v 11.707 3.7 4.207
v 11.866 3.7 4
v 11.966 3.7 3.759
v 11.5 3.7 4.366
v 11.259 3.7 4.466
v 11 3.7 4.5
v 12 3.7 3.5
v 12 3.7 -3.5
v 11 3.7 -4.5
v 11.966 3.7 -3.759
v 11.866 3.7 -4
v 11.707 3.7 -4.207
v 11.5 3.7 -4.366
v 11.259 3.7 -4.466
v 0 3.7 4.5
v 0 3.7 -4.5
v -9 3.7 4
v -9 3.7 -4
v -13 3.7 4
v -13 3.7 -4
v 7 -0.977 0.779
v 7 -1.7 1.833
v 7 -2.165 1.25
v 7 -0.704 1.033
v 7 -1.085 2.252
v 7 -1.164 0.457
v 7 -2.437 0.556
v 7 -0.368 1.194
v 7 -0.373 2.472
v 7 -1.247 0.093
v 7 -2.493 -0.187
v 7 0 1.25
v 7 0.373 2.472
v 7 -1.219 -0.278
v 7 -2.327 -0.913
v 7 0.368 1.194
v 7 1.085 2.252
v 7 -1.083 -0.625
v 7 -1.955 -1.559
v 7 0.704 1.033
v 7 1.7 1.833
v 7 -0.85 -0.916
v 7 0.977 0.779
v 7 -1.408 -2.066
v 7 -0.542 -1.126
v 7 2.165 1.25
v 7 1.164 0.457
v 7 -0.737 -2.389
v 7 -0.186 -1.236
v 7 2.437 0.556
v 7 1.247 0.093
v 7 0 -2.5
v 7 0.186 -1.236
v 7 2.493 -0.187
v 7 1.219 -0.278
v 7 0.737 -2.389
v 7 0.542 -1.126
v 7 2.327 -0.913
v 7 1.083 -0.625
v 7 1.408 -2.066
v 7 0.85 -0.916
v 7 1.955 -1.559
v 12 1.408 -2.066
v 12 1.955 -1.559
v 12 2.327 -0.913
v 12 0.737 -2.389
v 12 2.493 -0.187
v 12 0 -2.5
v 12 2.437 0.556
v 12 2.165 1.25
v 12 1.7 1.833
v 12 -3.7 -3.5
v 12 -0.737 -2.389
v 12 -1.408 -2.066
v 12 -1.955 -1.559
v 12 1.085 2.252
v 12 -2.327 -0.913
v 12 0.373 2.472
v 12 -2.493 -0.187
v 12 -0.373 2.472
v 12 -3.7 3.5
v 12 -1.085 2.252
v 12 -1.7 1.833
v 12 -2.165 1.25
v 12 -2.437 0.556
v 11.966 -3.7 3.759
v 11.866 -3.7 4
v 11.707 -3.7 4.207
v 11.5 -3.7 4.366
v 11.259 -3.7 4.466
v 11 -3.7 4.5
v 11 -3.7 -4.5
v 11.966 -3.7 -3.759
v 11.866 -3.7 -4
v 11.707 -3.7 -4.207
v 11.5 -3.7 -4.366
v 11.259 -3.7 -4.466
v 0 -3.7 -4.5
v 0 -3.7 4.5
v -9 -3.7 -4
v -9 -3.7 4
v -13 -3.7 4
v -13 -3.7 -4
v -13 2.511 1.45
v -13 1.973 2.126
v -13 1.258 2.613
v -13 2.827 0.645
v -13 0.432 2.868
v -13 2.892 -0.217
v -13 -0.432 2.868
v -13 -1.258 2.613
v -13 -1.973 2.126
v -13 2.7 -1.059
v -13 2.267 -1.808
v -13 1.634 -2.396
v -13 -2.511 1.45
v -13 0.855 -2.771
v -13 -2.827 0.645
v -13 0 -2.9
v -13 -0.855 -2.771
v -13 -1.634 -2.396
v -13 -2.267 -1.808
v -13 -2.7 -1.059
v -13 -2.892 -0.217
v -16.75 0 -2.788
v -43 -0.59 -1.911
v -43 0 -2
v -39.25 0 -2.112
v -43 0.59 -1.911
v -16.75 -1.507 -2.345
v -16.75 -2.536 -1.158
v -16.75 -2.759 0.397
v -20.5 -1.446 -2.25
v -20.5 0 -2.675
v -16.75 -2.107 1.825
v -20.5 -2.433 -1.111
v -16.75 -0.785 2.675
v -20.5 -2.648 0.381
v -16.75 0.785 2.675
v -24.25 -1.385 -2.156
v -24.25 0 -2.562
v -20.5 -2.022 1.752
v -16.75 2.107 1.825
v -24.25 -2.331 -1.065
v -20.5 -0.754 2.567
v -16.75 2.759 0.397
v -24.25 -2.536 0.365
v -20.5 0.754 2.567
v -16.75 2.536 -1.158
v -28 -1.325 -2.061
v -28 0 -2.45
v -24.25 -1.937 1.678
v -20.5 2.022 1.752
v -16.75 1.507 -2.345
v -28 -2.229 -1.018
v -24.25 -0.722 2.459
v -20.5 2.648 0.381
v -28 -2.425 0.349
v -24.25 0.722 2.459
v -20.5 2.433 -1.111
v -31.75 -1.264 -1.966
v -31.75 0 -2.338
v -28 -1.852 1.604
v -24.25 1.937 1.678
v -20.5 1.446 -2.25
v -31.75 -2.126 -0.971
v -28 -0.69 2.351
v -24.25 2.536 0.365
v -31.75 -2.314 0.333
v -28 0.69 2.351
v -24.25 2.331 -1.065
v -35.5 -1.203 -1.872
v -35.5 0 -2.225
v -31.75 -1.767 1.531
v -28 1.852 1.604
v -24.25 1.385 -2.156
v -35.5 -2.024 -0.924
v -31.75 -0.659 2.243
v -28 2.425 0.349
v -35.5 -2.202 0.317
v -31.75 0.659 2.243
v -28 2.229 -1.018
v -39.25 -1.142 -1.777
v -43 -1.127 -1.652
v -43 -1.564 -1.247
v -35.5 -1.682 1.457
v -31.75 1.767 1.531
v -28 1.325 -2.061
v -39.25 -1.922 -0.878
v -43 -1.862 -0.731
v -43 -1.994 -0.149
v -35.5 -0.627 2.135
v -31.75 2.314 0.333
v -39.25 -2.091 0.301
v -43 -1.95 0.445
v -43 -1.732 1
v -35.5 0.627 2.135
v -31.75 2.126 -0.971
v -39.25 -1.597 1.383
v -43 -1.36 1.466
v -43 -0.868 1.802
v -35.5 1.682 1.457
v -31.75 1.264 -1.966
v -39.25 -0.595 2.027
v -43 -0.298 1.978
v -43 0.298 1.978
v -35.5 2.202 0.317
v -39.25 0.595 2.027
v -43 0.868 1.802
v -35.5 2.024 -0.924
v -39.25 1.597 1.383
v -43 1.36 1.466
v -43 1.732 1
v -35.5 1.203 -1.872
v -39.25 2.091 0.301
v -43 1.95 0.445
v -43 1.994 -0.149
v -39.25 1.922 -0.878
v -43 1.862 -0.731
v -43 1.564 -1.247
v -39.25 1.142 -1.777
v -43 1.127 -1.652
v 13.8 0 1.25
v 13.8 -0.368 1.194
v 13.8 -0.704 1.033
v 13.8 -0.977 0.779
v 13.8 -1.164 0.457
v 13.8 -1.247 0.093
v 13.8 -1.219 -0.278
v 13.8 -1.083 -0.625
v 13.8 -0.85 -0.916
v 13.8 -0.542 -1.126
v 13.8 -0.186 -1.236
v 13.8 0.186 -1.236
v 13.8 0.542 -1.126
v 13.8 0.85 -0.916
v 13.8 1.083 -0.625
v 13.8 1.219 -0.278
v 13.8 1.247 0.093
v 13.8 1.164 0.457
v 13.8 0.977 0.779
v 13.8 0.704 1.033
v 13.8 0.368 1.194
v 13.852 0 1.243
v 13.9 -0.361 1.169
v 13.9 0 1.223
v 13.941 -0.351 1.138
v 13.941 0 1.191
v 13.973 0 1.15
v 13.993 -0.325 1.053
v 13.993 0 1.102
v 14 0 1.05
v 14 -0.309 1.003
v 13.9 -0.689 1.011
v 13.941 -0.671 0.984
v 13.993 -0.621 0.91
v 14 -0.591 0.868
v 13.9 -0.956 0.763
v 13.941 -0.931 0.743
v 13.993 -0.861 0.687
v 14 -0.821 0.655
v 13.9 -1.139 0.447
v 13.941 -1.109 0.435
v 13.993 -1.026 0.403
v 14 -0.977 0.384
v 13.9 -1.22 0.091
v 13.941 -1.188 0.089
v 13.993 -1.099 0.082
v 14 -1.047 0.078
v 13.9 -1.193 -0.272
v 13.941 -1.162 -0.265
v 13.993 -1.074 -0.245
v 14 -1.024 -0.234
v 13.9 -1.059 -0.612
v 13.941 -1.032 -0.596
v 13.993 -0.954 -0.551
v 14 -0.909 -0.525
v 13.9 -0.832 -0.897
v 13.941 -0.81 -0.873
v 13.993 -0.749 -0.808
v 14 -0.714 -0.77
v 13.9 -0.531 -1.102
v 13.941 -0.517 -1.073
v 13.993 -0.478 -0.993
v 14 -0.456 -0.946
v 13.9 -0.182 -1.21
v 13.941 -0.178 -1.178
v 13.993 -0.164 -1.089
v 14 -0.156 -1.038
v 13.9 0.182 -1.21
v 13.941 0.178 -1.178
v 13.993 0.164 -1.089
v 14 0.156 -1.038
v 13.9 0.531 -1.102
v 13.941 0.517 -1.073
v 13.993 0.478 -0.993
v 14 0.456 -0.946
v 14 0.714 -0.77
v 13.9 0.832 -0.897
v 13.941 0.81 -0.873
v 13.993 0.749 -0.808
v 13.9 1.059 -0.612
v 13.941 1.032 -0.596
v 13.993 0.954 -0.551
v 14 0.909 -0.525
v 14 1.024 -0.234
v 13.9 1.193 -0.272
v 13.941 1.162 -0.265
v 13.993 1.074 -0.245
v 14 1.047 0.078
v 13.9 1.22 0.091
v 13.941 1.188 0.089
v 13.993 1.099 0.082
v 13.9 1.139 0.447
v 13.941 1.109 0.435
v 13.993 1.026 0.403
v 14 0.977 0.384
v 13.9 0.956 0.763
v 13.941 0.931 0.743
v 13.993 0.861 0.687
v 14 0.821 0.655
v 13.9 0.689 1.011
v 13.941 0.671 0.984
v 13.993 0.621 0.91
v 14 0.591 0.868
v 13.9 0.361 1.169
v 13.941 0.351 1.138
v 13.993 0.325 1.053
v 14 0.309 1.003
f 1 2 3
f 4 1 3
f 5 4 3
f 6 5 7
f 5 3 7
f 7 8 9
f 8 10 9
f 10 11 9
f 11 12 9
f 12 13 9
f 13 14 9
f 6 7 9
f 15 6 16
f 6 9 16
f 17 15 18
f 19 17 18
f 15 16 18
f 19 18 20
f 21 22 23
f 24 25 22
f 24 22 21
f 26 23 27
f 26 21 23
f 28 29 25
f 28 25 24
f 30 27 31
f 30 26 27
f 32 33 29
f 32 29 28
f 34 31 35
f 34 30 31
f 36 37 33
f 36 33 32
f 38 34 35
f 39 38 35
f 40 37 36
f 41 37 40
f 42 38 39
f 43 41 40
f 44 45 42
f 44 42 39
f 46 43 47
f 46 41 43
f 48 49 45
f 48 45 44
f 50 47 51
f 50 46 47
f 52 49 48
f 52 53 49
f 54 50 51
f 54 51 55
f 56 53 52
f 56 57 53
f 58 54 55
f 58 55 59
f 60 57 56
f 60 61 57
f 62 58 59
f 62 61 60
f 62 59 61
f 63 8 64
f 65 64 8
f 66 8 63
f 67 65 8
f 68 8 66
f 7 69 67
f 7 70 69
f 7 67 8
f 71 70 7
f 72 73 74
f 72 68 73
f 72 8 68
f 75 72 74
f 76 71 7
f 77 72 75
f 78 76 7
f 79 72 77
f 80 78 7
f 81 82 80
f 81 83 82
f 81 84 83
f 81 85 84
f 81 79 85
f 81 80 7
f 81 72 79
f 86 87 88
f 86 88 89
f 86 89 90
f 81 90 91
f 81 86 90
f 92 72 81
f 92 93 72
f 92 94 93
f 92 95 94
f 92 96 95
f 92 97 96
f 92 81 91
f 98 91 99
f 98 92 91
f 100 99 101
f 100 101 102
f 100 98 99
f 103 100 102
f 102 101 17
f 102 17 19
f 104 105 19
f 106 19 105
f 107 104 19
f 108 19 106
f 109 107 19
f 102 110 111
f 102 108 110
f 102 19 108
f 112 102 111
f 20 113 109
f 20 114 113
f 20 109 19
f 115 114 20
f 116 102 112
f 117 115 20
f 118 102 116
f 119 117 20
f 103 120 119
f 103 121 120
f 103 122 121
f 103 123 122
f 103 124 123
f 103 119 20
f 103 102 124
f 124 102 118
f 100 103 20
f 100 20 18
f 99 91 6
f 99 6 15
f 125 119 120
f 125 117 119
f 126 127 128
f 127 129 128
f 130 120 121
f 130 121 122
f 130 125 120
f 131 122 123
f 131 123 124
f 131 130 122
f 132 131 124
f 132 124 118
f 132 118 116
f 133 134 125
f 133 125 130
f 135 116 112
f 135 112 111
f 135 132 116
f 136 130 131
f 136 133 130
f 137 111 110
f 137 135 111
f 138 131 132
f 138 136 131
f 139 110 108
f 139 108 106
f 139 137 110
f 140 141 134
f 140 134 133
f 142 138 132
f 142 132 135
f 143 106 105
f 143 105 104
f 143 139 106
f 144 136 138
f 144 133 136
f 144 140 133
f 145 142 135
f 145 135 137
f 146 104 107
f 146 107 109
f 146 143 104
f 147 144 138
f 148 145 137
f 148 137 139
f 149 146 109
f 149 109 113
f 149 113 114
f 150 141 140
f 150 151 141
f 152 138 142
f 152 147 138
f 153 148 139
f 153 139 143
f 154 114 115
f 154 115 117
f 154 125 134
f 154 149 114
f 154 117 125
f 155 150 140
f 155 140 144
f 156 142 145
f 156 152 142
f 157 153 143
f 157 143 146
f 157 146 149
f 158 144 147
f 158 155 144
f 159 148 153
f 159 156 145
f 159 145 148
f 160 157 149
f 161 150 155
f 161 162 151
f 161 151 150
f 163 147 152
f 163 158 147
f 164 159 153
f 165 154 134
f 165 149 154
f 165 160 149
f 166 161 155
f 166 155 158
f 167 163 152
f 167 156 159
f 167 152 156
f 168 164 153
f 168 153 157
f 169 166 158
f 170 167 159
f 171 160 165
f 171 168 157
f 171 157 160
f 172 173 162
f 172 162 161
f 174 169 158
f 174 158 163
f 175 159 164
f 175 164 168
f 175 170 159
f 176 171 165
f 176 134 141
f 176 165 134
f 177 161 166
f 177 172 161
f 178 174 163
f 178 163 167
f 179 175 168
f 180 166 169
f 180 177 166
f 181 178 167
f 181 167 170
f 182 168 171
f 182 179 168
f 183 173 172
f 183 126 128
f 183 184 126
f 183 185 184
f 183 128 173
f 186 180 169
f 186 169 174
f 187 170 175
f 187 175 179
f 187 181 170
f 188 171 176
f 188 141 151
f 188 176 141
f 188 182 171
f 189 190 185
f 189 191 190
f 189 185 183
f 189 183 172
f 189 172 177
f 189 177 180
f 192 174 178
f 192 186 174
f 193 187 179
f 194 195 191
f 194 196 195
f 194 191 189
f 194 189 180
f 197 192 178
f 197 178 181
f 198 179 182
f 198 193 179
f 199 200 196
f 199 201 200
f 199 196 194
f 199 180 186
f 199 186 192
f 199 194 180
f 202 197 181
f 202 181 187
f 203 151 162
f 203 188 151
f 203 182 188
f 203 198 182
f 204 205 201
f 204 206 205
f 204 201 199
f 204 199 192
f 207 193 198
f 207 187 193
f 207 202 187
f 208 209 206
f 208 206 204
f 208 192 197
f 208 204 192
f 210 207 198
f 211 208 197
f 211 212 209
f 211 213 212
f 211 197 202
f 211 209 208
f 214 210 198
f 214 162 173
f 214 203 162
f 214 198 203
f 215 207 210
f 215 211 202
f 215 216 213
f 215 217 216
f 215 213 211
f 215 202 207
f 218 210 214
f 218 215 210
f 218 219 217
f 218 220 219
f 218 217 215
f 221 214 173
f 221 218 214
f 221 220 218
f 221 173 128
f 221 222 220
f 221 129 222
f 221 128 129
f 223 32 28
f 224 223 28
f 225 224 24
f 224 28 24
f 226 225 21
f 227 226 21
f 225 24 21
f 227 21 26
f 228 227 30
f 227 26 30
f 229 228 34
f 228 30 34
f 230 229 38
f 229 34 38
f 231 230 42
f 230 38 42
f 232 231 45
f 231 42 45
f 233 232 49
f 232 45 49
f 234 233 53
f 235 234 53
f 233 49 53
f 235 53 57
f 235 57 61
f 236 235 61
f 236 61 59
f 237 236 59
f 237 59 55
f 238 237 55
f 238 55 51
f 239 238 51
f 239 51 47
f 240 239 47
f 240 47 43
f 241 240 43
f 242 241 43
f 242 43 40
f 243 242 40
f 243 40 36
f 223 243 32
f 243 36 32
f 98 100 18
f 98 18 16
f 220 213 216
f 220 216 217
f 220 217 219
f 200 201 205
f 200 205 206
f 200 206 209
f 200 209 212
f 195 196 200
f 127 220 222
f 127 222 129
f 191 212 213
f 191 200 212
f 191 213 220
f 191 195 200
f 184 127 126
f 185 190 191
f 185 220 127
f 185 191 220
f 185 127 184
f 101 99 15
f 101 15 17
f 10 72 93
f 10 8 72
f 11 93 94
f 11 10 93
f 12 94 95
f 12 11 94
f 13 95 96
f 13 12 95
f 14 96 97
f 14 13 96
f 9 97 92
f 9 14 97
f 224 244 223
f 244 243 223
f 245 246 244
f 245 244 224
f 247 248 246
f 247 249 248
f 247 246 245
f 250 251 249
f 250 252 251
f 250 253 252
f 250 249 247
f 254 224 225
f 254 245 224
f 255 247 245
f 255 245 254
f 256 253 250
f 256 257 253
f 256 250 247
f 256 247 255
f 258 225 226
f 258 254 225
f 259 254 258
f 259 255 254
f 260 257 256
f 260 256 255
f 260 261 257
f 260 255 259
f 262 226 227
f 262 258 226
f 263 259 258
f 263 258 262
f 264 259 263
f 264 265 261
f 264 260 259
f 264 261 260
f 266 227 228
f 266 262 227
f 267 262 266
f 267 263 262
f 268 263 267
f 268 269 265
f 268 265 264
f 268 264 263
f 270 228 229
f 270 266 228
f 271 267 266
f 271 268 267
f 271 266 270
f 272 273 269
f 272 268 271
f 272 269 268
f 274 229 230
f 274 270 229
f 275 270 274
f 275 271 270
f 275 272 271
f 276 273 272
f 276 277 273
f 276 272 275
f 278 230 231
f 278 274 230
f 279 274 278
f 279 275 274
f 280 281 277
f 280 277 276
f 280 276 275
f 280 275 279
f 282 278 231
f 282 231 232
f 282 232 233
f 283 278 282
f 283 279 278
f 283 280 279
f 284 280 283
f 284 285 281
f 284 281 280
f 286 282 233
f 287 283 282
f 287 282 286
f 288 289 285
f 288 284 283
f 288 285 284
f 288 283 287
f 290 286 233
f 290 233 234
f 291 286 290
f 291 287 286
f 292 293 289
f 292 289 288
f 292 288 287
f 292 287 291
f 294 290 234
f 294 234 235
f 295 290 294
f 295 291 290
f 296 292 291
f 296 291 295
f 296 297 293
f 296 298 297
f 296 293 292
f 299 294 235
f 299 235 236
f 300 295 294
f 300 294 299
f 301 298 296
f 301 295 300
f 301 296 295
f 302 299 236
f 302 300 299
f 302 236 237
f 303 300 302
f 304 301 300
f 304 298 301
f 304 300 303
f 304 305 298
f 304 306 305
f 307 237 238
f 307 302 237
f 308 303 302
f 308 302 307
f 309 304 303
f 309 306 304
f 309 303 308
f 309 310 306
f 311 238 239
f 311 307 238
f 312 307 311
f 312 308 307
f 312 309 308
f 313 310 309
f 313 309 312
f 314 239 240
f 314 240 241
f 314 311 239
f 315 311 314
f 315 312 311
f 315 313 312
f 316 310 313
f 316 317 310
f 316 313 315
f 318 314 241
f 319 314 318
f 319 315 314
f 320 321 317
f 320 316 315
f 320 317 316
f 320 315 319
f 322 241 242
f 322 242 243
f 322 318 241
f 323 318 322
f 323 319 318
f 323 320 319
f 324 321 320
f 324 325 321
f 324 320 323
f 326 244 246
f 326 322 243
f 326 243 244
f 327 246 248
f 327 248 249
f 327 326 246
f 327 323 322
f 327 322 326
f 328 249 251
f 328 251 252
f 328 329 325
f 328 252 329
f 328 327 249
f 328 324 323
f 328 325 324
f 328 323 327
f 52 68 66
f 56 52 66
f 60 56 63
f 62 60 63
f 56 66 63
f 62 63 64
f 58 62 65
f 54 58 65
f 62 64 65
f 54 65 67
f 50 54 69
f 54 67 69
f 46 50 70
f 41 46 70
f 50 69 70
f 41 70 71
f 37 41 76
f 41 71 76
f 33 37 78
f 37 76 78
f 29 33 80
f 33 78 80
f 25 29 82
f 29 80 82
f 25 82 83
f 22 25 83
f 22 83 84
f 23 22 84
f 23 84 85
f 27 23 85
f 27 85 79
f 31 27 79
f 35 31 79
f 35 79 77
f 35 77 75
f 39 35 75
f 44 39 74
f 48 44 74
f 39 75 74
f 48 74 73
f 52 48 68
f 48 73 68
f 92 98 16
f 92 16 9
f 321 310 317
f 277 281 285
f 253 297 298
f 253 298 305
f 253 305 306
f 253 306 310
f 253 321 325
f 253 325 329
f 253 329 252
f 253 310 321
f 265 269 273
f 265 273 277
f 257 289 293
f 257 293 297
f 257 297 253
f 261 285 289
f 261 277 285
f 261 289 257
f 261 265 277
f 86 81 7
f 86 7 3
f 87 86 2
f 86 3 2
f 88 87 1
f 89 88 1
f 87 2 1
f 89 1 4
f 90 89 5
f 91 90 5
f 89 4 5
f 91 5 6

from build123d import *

# Parameters (mm, degrees)
EXTRUDE_1_DEPTH      = 3.7
EXTRUDE_1_DEPTH_BACK = 3.7
SKETCH_3_R           = 2.5
CUT_EXTRUDE_1_DEPTH  = 5
SKETCH_4_R           = 1.25
EXTRUDE_2_DEPTH      = 7
FILLET_1_R           = 1
FILLET_2_R           = 0.2


with BuildPart() as part:
    # 草图2 → 凸台-拉伸1 (new, two sides: drawn at the far end of the back side and taken through both)
    with BuildSketch(Plane(origin=(0, 0, 0), x_dir=(1, 0, 0), z_dir=(0, 1, 0)).offset(-EXTRUDE_1_DEPTH_BACK)):
        Polygon((12, 4.5), (12, -4.5), (0, -4.5), (-9, -4), (-13, -4), (-13, 4), (-9, 4), (0, 4.5), align=None)
    extrude(amount=EXTRUDE_1_DEPTH + EXTRUDE_1_DEPTH_BACK)

    # 草图3 → 切除-拉伸1 (cut)
    with BuildSketch(Plane(origin=(12, 0, 0), x_dir=(0, 0, -1), z_dir=(1, 0, 0))):
        Circle(SKETCH_3_R)
    extrude(amount=-CUT_EXTRUDE_1_DEPTH, mode=Mode.SUBTRACT)

    # 草图4 → 凸台-拉伸2 (add)
    with BuildSketch(Plane(origin=(7, 0, 0), x_dir=(0, 0, -1), z_dir=(1, 0, 0))):
        with Locations(Location((0, 0, 0), (0, 0, 180))):
            Circle(SKETCH_4_R)
    extrude(amount=EXTRUDE_2_DEPTH)

    # 圆角1
    fillet_1_edges = [part.edges().sort_by_distance(p)[0] for p in [
        (12, 0, -4.5),
        (12, 0, 4.5),
    ]]
    fillet(fillet_1_edges, radius=FILLET_1_R)

    # 圆角2
    fillet_2_edges = [part.edges().sort_by_distance(p)[0] for p in [
        (14, 0, -1.25),
    ]]
    fillet(fillet_2_edges, radius=FILLET_2_R)

    # 草图5 → 旋转1 (revolve)
    with BuildSketch(Plane(origin=(0, 0, 0), x_dir=(1, 0, 0), z_dir=(0, 1, 0))):
        Polygon((-13, 2.9), (-43, 2), (-43, 0), (-13, 0), align=None)
    revolve(axis=Axis((5.484305881, 0, 0), (-1, 0, 0)))


solid = part.part
